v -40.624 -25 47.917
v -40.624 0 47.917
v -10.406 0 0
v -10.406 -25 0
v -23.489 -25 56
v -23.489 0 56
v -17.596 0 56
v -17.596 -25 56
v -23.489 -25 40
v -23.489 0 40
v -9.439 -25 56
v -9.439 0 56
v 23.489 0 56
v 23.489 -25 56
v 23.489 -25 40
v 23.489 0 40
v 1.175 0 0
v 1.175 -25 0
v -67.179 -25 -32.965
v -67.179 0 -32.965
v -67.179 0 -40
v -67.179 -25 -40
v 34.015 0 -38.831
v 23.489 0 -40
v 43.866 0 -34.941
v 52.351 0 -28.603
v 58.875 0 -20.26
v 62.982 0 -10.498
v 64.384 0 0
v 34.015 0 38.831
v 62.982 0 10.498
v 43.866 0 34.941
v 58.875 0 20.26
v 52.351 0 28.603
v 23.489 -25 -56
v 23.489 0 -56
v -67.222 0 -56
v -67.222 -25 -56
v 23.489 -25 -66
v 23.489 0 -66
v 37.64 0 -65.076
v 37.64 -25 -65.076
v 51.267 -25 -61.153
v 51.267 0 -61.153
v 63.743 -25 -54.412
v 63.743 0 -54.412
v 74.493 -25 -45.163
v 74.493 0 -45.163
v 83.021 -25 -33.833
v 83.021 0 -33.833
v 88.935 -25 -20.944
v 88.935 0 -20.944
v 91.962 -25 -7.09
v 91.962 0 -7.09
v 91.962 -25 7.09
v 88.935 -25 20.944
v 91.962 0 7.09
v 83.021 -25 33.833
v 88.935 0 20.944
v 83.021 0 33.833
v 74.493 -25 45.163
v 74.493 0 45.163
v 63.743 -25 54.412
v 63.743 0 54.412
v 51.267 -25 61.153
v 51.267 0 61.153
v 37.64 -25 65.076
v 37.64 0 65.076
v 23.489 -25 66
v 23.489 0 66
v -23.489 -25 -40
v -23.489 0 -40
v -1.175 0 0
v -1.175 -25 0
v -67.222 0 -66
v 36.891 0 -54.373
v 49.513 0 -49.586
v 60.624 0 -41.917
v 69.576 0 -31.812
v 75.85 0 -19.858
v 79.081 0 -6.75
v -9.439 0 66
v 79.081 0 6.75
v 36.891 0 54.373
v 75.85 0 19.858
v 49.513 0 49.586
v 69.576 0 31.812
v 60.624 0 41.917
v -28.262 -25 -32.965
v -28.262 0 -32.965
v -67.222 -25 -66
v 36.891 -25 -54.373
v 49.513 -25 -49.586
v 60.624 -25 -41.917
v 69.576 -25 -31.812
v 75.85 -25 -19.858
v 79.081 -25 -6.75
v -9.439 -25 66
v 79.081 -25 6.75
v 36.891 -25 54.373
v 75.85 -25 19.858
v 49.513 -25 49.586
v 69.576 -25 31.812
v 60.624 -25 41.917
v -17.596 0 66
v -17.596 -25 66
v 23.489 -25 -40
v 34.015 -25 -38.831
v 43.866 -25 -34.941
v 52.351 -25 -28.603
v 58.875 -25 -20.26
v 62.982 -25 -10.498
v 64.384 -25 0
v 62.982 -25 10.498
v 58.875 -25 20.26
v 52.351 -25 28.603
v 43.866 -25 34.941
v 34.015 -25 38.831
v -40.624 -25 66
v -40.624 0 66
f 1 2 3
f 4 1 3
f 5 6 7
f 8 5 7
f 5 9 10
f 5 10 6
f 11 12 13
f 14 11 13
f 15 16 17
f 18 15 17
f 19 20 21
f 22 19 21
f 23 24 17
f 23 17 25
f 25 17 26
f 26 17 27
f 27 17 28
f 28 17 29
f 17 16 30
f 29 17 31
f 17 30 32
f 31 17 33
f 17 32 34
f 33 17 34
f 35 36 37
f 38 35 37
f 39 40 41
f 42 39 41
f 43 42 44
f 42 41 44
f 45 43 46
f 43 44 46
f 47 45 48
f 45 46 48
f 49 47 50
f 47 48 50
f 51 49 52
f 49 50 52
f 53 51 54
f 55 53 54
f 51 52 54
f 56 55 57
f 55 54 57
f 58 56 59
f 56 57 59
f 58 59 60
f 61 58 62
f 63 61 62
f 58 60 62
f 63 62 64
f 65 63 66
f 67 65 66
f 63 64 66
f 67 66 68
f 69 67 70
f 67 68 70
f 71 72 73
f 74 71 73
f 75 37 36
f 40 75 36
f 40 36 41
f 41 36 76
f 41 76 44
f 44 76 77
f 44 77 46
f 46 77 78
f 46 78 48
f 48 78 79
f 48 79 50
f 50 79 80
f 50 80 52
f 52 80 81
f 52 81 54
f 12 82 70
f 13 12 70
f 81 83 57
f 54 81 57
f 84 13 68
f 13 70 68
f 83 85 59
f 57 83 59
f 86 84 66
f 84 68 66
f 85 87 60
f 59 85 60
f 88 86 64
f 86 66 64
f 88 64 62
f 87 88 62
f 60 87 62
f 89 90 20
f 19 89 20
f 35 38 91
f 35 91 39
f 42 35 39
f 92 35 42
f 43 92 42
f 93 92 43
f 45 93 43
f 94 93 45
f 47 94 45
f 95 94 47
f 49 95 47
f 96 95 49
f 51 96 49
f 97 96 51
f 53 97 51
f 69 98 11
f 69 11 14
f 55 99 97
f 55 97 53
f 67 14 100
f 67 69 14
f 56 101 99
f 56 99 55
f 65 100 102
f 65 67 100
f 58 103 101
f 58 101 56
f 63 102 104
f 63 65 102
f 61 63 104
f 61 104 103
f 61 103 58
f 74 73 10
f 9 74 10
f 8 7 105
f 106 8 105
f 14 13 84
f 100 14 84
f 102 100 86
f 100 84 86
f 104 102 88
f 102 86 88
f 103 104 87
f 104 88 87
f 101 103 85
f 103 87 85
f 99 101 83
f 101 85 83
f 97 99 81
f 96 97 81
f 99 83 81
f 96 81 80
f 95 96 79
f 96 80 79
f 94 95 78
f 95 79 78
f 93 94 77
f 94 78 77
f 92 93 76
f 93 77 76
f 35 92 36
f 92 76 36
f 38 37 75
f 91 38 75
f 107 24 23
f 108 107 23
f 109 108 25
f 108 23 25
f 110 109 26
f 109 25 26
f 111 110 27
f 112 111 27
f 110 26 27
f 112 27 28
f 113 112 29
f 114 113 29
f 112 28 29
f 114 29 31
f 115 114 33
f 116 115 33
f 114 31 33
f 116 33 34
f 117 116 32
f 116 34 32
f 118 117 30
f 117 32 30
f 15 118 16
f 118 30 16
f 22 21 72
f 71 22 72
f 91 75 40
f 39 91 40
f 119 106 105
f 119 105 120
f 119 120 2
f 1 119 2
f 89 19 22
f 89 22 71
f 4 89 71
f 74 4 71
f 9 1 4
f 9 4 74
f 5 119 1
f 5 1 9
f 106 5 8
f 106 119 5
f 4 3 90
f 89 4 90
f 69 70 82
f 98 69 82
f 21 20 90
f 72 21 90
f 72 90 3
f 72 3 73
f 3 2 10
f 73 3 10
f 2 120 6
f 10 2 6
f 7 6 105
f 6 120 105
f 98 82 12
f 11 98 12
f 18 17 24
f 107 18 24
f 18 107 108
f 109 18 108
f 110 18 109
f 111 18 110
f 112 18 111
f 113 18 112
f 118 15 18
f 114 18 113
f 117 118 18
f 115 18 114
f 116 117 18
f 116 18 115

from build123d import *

# Parameters (mm, degrees)
F1_DEPTH = 25


with BuildPart() as f1:
    # F0 (on Front) → F1 (new body)
    with BuildSketch(Plane.XZ):
        with BuildLine():
            ThreePointArc((23.488847, 56), (79.488847, 0), (23.488847, -56))
            Line((23.488847, -56), (-67.221503, -56))
            Line((-67.221503, -56), (-67.221503, -66))
            Line((-67.221503, -66), (23.488847, -66))
            ThreePointArc((23.488847, -66), (92.343168, 0), (23.488847, 66))
            Line((23.488847, 66), (-9.438657, 66))
            Line((-9.438657, 66), (-9.438657, 56))
            Line((-9.438657, 56), (23.488847, 56))
        make_face()
        with BuildLine():
            Line((23.488847, 40), (1.174515, 0))
            Line((1.174515, 0), (23.488847, -40))
            ThreePointArc((23.488847, -40), (64.384039, 0), (23.488847, 40))
        make_face()
        Polygon((-23.488847, -40), (-1.174515, 0), (-23.488847, 40), (-23.488847, 56), (-17.595538, 56), (-17.595538, 66), (-40.624071, 66), (-40.624071, 47.91715), (-10.406044, 0), (-28.26215, -32.965118), (-67.179307, -32.965118), (-67.179307, -40), align=None)
    extrude(amount=F1_DEPTH)


solid = f1.part
